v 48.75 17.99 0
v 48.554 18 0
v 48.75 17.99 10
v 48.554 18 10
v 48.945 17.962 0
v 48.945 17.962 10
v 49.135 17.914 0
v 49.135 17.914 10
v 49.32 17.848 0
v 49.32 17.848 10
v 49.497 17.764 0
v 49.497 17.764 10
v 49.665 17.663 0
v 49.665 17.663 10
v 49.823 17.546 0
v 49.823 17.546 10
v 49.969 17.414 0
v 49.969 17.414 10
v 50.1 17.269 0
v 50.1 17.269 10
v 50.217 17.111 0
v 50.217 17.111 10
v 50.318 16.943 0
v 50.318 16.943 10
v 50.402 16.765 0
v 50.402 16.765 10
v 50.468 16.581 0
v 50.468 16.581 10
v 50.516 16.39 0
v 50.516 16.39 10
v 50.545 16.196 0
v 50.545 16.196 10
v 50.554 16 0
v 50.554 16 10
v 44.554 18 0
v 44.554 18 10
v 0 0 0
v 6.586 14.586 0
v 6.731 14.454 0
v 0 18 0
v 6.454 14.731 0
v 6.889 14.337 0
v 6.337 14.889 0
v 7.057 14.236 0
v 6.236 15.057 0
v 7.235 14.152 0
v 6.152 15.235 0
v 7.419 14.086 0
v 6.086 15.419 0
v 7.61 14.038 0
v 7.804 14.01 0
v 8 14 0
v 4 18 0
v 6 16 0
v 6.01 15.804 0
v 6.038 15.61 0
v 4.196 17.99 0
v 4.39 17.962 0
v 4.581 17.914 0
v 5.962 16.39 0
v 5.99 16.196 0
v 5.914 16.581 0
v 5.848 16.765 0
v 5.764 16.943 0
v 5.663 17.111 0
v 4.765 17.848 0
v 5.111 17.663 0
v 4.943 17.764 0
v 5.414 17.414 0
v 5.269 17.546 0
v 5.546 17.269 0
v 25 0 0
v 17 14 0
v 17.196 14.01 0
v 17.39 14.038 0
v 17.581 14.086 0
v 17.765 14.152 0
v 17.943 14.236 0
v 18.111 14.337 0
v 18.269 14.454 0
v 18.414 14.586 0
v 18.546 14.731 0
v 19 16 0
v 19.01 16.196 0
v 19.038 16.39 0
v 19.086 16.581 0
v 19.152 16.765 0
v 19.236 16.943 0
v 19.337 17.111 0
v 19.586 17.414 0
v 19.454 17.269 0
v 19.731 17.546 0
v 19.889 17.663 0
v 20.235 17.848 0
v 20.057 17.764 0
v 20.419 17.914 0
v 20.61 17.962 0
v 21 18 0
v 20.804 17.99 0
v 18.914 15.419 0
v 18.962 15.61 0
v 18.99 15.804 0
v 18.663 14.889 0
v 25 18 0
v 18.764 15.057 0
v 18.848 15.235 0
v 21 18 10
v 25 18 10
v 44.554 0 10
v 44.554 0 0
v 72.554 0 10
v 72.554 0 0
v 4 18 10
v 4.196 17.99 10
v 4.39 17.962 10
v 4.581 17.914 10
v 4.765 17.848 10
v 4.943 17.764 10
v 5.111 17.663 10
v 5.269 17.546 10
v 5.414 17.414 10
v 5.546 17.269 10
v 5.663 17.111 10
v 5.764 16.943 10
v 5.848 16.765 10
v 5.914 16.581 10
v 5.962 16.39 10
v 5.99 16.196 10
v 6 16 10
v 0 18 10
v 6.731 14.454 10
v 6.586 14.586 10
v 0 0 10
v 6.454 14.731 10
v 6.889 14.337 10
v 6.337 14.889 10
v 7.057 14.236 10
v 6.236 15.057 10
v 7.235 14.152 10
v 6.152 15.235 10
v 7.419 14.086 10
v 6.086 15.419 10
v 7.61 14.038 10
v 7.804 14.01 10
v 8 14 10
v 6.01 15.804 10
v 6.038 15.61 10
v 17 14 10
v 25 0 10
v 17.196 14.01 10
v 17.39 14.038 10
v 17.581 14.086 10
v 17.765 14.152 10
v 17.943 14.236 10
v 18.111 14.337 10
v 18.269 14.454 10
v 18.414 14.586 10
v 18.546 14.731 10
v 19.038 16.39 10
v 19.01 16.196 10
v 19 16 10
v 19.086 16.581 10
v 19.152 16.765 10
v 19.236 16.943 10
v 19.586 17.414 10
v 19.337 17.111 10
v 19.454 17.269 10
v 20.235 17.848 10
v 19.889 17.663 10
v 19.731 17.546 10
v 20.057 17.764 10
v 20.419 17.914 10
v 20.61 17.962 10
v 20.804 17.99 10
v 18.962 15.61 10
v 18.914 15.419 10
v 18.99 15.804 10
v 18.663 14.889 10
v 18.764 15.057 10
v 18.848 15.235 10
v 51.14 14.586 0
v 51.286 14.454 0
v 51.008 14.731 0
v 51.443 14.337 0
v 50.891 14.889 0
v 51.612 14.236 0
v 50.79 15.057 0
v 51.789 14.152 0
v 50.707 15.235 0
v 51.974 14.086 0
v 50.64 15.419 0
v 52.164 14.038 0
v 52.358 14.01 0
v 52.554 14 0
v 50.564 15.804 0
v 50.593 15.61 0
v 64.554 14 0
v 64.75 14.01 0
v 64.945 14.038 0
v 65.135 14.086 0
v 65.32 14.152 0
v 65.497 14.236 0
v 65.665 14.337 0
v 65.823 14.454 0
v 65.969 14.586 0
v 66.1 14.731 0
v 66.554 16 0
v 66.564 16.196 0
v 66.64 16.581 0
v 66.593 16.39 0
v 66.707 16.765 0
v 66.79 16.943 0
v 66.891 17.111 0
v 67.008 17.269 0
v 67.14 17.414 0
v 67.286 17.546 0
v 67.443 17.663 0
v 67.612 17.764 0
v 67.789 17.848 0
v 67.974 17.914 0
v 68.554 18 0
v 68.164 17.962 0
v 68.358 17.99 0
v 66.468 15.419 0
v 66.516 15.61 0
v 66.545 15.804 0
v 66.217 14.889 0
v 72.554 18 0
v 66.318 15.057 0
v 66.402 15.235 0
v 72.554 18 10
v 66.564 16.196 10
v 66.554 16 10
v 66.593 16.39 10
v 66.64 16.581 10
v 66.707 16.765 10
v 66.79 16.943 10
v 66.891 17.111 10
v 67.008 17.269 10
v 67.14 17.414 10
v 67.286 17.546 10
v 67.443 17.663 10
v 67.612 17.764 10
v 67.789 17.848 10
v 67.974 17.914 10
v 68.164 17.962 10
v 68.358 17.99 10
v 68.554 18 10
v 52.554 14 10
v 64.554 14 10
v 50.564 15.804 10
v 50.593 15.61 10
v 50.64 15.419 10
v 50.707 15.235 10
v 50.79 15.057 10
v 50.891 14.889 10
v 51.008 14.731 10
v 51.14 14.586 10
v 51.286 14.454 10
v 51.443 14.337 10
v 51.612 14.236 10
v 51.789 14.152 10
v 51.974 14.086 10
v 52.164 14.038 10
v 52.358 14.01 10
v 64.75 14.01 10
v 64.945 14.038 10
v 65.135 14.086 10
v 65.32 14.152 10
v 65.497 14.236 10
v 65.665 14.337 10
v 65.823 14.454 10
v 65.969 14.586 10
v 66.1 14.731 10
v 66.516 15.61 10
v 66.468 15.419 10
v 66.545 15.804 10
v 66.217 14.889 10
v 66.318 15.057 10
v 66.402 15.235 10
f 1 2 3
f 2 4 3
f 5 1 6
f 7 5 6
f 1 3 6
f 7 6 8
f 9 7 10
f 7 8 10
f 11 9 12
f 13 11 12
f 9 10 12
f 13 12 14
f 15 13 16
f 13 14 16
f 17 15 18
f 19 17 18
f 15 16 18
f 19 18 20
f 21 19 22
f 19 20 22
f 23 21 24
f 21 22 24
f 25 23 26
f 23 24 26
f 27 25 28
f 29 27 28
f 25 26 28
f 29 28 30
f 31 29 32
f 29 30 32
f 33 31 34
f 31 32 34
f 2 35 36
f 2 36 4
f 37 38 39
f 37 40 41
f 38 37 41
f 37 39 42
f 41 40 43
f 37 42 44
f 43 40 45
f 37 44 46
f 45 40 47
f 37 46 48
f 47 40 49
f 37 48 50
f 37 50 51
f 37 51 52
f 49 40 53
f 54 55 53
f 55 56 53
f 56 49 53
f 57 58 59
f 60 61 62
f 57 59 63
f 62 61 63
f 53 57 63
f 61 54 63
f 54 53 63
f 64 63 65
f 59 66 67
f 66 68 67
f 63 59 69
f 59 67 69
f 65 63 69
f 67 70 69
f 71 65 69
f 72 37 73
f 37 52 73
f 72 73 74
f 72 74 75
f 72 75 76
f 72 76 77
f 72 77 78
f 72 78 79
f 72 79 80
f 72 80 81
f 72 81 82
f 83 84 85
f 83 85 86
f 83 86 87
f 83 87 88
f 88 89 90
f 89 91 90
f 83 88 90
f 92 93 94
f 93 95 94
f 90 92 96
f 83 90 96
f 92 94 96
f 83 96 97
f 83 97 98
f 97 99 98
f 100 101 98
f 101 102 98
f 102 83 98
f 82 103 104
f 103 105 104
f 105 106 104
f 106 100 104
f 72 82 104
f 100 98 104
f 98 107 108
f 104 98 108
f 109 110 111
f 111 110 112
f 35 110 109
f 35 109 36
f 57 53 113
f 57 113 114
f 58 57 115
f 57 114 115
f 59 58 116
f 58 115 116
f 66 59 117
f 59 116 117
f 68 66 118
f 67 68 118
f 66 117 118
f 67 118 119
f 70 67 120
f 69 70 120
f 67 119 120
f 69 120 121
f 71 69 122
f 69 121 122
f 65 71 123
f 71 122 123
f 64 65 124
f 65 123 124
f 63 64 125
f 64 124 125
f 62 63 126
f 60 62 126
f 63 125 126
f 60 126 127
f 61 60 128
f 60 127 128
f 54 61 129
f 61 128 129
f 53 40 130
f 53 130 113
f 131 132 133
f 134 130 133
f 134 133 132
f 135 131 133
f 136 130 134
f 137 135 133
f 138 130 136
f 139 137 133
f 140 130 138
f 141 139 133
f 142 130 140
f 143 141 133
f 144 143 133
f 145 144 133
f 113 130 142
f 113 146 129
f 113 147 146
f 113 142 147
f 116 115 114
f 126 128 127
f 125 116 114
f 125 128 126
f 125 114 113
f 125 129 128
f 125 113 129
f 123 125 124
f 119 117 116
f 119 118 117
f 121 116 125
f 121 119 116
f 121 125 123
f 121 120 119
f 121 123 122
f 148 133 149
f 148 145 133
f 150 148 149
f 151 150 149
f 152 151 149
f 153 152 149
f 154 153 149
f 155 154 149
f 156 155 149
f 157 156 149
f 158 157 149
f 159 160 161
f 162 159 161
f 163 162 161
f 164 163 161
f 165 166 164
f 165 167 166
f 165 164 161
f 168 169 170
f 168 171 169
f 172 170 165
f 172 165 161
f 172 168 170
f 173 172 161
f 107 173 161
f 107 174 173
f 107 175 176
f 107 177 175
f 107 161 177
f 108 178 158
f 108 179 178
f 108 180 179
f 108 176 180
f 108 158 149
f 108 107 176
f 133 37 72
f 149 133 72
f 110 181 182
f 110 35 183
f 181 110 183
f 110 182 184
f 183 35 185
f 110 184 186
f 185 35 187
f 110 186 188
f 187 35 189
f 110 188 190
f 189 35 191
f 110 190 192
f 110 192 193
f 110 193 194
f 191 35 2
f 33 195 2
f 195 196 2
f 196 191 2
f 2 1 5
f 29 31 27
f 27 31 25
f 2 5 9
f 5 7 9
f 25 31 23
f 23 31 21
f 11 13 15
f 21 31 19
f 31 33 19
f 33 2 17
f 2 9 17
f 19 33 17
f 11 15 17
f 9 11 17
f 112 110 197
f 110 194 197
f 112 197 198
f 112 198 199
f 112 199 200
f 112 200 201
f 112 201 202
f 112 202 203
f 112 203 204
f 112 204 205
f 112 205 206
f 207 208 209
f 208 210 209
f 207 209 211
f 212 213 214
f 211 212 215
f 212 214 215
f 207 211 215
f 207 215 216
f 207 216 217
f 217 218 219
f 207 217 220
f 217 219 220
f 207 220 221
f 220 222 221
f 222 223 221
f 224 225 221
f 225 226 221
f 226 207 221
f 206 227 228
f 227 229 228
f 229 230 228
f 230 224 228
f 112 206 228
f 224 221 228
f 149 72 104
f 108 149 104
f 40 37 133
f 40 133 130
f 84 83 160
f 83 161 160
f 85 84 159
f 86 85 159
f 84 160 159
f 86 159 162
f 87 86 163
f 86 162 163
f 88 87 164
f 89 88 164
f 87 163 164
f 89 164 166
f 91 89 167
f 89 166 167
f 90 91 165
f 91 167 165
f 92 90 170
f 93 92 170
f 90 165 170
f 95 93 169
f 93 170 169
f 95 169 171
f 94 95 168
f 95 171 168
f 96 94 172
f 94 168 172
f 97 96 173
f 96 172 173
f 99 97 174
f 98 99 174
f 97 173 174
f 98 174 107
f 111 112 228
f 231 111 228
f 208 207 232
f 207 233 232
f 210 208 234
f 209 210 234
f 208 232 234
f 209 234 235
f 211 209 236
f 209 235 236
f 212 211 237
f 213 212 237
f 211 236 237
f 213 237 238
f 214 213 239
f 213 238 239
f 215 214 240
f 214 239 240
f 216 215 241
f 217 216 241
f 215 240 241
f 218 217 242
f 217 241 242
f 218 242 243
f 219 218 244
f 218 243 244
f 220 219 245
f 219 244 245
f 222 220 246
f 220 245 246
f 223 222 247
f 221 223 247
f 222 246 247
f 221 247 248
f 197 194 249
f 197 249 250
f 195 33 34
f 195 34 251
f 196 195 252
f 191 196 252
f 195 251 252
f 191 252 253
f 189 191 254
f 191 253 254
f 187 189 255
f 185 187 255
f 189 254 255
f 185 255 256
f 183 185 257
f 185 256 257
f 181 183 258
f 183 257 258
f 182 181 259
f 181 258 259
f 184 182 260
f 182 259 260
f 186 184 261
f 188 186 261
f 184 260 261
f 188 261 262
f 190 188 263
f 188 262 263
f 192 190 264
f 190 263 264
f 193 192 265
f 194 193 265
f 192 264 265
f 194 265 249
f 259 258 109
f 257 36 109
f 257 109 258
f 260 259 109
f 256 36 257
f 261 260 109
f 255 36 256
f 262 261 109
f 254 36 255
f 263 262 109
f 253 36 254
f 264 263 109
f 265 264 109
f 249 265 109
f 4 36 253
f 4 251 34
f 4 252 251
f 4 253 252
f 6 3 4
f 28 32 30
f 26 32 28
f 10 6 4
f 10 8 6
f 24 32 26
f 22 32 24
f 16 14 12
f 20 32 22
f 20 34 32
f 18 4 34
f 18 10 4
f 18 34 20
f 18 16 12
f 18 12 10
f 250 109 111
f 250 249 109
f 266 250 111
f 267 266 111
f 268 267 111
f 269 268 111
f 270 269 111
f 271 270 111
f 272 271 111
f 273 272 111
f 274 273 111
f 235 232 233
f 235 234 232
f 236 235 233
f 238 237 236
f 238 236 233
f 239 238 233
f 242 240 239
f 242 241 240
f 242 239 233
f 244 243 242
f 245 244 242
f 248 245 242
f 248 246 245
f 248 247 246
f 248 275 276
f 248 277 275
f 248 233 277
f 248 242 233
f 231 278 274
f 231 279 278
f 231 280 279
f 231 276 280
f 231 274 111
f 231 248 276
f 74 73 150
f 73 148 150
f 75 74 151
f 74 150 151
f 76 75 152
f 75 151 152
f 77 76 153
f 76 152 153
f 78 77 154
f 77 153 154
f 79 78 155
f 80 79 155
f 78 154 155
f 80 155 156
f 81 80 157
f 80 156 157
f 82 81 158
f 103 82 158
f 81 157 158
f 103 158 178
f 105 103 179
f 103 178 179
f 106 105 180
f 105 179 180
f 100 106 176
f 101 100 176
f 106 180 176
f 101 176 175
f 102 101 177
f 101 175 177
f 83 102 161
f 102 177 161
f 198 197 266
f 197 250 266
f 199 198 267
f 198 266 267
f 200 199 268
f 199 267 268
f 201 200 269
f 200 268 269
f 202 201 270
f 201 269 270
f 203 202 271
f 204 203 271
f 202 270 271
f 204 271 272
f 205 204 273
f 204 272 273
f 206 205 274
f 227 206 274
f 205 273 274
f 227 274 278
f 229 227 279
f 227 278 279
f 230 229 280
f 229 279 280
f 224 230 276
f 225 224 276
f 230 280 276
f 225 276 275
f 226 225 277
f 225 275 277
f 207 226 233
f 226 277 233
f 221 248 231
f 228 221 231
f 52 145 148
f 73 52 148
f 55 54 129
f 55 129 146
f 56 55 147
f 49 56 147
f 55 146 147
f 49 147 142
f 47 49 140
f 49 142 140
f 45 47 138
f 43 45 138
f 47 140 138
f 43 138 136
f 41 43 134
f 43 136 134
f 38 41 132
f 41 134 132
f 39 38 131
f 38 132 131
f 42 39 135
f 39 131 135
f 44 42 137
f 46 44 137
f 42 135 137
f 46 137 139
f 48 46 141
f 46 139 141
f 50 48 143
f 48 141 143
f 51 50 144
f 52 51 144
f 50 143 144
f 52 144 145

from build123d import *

# Parameters (mm, degrees)
F0_W     = 25
F0_H     = 18
F1_DEPTH = 10
F2_W     = 13
F2_H     = 4
F3_DEPTH = 10.001
F4_W     = 28
F4_H     = 18
F5_DEPTH = 10
F6_W     = 16
F6_H     = 4
F7_DEPTH = 10.001
F8_R     = 1.99999
F8_2_R   = 1.99999


# Not quite as in the source:
# - a fillet or chamfer is up to 0.001 mm smaller than in the source, because OpenCascade refuses the exact size


with BuildPart() as f1:
    # F0 (on Top) → F1 (new body)
    with BuildSketch(Plane.XY):
        with Locations((12.5, 9)):
            Rectangle(F0_W, F0_H)
    extrude(amount=F1_DEPTH)

    # F2 (on Top) → F3 (cut, through all)
    with BuildSketch(Plane.XY):
        with Locations((12.5, 16)):
            Rectangle(F2_W, F2_H)
    extrude(amount=F3_DEPTH, mode=Mode.SUBTRACT)

    # F8 (radius 2 in the source; OpenCascade refuses exactly that, so slightly less here)
    f8_edges = [f1.edges().sort_by_distance(p)[0] for p in [
        (6, 14, 5),
        (19, 14, 5),
        (6, 18, 5),
        (19, 18, 5),
    ]]
    fillet(f8_edges, radius=F8_R)


with BuildPart() as f5:
    # F4 (on Top) → F5 (new body)
    with BuildSketch(Plane.XY):
        with Locations((58.5543287322, 9)):
            Rectangle(F4_W, F4_H)
    extrude(amount=F5_DEPTH)

    # F6 (on Top) → F7 (cut, through all)
    with BuildSketch(Plane.XY):
        with Locations((58.5543287322, 16)):
            Rectangle(F6_W, F6_H)
    extrude(amount=F7_DEPTH, mode=Mode.SUBTRACT)

    # F8#2 (radius 2 in the source; OpenCascade refuses exactly that, so slightly less here)
    f8_2_edges = [f5.edges().sort_by_distance(p)[0] for p in [
        (50.554329, 18, 5),
        (50.554329, 14, 5),
        (66.554329, 14, 5),
        (66.554329, 18, 5),
    ]]
    fillet(f8_2_edges, radius=F8_2_R)


solid = Compound([f1.part, f5.part])
